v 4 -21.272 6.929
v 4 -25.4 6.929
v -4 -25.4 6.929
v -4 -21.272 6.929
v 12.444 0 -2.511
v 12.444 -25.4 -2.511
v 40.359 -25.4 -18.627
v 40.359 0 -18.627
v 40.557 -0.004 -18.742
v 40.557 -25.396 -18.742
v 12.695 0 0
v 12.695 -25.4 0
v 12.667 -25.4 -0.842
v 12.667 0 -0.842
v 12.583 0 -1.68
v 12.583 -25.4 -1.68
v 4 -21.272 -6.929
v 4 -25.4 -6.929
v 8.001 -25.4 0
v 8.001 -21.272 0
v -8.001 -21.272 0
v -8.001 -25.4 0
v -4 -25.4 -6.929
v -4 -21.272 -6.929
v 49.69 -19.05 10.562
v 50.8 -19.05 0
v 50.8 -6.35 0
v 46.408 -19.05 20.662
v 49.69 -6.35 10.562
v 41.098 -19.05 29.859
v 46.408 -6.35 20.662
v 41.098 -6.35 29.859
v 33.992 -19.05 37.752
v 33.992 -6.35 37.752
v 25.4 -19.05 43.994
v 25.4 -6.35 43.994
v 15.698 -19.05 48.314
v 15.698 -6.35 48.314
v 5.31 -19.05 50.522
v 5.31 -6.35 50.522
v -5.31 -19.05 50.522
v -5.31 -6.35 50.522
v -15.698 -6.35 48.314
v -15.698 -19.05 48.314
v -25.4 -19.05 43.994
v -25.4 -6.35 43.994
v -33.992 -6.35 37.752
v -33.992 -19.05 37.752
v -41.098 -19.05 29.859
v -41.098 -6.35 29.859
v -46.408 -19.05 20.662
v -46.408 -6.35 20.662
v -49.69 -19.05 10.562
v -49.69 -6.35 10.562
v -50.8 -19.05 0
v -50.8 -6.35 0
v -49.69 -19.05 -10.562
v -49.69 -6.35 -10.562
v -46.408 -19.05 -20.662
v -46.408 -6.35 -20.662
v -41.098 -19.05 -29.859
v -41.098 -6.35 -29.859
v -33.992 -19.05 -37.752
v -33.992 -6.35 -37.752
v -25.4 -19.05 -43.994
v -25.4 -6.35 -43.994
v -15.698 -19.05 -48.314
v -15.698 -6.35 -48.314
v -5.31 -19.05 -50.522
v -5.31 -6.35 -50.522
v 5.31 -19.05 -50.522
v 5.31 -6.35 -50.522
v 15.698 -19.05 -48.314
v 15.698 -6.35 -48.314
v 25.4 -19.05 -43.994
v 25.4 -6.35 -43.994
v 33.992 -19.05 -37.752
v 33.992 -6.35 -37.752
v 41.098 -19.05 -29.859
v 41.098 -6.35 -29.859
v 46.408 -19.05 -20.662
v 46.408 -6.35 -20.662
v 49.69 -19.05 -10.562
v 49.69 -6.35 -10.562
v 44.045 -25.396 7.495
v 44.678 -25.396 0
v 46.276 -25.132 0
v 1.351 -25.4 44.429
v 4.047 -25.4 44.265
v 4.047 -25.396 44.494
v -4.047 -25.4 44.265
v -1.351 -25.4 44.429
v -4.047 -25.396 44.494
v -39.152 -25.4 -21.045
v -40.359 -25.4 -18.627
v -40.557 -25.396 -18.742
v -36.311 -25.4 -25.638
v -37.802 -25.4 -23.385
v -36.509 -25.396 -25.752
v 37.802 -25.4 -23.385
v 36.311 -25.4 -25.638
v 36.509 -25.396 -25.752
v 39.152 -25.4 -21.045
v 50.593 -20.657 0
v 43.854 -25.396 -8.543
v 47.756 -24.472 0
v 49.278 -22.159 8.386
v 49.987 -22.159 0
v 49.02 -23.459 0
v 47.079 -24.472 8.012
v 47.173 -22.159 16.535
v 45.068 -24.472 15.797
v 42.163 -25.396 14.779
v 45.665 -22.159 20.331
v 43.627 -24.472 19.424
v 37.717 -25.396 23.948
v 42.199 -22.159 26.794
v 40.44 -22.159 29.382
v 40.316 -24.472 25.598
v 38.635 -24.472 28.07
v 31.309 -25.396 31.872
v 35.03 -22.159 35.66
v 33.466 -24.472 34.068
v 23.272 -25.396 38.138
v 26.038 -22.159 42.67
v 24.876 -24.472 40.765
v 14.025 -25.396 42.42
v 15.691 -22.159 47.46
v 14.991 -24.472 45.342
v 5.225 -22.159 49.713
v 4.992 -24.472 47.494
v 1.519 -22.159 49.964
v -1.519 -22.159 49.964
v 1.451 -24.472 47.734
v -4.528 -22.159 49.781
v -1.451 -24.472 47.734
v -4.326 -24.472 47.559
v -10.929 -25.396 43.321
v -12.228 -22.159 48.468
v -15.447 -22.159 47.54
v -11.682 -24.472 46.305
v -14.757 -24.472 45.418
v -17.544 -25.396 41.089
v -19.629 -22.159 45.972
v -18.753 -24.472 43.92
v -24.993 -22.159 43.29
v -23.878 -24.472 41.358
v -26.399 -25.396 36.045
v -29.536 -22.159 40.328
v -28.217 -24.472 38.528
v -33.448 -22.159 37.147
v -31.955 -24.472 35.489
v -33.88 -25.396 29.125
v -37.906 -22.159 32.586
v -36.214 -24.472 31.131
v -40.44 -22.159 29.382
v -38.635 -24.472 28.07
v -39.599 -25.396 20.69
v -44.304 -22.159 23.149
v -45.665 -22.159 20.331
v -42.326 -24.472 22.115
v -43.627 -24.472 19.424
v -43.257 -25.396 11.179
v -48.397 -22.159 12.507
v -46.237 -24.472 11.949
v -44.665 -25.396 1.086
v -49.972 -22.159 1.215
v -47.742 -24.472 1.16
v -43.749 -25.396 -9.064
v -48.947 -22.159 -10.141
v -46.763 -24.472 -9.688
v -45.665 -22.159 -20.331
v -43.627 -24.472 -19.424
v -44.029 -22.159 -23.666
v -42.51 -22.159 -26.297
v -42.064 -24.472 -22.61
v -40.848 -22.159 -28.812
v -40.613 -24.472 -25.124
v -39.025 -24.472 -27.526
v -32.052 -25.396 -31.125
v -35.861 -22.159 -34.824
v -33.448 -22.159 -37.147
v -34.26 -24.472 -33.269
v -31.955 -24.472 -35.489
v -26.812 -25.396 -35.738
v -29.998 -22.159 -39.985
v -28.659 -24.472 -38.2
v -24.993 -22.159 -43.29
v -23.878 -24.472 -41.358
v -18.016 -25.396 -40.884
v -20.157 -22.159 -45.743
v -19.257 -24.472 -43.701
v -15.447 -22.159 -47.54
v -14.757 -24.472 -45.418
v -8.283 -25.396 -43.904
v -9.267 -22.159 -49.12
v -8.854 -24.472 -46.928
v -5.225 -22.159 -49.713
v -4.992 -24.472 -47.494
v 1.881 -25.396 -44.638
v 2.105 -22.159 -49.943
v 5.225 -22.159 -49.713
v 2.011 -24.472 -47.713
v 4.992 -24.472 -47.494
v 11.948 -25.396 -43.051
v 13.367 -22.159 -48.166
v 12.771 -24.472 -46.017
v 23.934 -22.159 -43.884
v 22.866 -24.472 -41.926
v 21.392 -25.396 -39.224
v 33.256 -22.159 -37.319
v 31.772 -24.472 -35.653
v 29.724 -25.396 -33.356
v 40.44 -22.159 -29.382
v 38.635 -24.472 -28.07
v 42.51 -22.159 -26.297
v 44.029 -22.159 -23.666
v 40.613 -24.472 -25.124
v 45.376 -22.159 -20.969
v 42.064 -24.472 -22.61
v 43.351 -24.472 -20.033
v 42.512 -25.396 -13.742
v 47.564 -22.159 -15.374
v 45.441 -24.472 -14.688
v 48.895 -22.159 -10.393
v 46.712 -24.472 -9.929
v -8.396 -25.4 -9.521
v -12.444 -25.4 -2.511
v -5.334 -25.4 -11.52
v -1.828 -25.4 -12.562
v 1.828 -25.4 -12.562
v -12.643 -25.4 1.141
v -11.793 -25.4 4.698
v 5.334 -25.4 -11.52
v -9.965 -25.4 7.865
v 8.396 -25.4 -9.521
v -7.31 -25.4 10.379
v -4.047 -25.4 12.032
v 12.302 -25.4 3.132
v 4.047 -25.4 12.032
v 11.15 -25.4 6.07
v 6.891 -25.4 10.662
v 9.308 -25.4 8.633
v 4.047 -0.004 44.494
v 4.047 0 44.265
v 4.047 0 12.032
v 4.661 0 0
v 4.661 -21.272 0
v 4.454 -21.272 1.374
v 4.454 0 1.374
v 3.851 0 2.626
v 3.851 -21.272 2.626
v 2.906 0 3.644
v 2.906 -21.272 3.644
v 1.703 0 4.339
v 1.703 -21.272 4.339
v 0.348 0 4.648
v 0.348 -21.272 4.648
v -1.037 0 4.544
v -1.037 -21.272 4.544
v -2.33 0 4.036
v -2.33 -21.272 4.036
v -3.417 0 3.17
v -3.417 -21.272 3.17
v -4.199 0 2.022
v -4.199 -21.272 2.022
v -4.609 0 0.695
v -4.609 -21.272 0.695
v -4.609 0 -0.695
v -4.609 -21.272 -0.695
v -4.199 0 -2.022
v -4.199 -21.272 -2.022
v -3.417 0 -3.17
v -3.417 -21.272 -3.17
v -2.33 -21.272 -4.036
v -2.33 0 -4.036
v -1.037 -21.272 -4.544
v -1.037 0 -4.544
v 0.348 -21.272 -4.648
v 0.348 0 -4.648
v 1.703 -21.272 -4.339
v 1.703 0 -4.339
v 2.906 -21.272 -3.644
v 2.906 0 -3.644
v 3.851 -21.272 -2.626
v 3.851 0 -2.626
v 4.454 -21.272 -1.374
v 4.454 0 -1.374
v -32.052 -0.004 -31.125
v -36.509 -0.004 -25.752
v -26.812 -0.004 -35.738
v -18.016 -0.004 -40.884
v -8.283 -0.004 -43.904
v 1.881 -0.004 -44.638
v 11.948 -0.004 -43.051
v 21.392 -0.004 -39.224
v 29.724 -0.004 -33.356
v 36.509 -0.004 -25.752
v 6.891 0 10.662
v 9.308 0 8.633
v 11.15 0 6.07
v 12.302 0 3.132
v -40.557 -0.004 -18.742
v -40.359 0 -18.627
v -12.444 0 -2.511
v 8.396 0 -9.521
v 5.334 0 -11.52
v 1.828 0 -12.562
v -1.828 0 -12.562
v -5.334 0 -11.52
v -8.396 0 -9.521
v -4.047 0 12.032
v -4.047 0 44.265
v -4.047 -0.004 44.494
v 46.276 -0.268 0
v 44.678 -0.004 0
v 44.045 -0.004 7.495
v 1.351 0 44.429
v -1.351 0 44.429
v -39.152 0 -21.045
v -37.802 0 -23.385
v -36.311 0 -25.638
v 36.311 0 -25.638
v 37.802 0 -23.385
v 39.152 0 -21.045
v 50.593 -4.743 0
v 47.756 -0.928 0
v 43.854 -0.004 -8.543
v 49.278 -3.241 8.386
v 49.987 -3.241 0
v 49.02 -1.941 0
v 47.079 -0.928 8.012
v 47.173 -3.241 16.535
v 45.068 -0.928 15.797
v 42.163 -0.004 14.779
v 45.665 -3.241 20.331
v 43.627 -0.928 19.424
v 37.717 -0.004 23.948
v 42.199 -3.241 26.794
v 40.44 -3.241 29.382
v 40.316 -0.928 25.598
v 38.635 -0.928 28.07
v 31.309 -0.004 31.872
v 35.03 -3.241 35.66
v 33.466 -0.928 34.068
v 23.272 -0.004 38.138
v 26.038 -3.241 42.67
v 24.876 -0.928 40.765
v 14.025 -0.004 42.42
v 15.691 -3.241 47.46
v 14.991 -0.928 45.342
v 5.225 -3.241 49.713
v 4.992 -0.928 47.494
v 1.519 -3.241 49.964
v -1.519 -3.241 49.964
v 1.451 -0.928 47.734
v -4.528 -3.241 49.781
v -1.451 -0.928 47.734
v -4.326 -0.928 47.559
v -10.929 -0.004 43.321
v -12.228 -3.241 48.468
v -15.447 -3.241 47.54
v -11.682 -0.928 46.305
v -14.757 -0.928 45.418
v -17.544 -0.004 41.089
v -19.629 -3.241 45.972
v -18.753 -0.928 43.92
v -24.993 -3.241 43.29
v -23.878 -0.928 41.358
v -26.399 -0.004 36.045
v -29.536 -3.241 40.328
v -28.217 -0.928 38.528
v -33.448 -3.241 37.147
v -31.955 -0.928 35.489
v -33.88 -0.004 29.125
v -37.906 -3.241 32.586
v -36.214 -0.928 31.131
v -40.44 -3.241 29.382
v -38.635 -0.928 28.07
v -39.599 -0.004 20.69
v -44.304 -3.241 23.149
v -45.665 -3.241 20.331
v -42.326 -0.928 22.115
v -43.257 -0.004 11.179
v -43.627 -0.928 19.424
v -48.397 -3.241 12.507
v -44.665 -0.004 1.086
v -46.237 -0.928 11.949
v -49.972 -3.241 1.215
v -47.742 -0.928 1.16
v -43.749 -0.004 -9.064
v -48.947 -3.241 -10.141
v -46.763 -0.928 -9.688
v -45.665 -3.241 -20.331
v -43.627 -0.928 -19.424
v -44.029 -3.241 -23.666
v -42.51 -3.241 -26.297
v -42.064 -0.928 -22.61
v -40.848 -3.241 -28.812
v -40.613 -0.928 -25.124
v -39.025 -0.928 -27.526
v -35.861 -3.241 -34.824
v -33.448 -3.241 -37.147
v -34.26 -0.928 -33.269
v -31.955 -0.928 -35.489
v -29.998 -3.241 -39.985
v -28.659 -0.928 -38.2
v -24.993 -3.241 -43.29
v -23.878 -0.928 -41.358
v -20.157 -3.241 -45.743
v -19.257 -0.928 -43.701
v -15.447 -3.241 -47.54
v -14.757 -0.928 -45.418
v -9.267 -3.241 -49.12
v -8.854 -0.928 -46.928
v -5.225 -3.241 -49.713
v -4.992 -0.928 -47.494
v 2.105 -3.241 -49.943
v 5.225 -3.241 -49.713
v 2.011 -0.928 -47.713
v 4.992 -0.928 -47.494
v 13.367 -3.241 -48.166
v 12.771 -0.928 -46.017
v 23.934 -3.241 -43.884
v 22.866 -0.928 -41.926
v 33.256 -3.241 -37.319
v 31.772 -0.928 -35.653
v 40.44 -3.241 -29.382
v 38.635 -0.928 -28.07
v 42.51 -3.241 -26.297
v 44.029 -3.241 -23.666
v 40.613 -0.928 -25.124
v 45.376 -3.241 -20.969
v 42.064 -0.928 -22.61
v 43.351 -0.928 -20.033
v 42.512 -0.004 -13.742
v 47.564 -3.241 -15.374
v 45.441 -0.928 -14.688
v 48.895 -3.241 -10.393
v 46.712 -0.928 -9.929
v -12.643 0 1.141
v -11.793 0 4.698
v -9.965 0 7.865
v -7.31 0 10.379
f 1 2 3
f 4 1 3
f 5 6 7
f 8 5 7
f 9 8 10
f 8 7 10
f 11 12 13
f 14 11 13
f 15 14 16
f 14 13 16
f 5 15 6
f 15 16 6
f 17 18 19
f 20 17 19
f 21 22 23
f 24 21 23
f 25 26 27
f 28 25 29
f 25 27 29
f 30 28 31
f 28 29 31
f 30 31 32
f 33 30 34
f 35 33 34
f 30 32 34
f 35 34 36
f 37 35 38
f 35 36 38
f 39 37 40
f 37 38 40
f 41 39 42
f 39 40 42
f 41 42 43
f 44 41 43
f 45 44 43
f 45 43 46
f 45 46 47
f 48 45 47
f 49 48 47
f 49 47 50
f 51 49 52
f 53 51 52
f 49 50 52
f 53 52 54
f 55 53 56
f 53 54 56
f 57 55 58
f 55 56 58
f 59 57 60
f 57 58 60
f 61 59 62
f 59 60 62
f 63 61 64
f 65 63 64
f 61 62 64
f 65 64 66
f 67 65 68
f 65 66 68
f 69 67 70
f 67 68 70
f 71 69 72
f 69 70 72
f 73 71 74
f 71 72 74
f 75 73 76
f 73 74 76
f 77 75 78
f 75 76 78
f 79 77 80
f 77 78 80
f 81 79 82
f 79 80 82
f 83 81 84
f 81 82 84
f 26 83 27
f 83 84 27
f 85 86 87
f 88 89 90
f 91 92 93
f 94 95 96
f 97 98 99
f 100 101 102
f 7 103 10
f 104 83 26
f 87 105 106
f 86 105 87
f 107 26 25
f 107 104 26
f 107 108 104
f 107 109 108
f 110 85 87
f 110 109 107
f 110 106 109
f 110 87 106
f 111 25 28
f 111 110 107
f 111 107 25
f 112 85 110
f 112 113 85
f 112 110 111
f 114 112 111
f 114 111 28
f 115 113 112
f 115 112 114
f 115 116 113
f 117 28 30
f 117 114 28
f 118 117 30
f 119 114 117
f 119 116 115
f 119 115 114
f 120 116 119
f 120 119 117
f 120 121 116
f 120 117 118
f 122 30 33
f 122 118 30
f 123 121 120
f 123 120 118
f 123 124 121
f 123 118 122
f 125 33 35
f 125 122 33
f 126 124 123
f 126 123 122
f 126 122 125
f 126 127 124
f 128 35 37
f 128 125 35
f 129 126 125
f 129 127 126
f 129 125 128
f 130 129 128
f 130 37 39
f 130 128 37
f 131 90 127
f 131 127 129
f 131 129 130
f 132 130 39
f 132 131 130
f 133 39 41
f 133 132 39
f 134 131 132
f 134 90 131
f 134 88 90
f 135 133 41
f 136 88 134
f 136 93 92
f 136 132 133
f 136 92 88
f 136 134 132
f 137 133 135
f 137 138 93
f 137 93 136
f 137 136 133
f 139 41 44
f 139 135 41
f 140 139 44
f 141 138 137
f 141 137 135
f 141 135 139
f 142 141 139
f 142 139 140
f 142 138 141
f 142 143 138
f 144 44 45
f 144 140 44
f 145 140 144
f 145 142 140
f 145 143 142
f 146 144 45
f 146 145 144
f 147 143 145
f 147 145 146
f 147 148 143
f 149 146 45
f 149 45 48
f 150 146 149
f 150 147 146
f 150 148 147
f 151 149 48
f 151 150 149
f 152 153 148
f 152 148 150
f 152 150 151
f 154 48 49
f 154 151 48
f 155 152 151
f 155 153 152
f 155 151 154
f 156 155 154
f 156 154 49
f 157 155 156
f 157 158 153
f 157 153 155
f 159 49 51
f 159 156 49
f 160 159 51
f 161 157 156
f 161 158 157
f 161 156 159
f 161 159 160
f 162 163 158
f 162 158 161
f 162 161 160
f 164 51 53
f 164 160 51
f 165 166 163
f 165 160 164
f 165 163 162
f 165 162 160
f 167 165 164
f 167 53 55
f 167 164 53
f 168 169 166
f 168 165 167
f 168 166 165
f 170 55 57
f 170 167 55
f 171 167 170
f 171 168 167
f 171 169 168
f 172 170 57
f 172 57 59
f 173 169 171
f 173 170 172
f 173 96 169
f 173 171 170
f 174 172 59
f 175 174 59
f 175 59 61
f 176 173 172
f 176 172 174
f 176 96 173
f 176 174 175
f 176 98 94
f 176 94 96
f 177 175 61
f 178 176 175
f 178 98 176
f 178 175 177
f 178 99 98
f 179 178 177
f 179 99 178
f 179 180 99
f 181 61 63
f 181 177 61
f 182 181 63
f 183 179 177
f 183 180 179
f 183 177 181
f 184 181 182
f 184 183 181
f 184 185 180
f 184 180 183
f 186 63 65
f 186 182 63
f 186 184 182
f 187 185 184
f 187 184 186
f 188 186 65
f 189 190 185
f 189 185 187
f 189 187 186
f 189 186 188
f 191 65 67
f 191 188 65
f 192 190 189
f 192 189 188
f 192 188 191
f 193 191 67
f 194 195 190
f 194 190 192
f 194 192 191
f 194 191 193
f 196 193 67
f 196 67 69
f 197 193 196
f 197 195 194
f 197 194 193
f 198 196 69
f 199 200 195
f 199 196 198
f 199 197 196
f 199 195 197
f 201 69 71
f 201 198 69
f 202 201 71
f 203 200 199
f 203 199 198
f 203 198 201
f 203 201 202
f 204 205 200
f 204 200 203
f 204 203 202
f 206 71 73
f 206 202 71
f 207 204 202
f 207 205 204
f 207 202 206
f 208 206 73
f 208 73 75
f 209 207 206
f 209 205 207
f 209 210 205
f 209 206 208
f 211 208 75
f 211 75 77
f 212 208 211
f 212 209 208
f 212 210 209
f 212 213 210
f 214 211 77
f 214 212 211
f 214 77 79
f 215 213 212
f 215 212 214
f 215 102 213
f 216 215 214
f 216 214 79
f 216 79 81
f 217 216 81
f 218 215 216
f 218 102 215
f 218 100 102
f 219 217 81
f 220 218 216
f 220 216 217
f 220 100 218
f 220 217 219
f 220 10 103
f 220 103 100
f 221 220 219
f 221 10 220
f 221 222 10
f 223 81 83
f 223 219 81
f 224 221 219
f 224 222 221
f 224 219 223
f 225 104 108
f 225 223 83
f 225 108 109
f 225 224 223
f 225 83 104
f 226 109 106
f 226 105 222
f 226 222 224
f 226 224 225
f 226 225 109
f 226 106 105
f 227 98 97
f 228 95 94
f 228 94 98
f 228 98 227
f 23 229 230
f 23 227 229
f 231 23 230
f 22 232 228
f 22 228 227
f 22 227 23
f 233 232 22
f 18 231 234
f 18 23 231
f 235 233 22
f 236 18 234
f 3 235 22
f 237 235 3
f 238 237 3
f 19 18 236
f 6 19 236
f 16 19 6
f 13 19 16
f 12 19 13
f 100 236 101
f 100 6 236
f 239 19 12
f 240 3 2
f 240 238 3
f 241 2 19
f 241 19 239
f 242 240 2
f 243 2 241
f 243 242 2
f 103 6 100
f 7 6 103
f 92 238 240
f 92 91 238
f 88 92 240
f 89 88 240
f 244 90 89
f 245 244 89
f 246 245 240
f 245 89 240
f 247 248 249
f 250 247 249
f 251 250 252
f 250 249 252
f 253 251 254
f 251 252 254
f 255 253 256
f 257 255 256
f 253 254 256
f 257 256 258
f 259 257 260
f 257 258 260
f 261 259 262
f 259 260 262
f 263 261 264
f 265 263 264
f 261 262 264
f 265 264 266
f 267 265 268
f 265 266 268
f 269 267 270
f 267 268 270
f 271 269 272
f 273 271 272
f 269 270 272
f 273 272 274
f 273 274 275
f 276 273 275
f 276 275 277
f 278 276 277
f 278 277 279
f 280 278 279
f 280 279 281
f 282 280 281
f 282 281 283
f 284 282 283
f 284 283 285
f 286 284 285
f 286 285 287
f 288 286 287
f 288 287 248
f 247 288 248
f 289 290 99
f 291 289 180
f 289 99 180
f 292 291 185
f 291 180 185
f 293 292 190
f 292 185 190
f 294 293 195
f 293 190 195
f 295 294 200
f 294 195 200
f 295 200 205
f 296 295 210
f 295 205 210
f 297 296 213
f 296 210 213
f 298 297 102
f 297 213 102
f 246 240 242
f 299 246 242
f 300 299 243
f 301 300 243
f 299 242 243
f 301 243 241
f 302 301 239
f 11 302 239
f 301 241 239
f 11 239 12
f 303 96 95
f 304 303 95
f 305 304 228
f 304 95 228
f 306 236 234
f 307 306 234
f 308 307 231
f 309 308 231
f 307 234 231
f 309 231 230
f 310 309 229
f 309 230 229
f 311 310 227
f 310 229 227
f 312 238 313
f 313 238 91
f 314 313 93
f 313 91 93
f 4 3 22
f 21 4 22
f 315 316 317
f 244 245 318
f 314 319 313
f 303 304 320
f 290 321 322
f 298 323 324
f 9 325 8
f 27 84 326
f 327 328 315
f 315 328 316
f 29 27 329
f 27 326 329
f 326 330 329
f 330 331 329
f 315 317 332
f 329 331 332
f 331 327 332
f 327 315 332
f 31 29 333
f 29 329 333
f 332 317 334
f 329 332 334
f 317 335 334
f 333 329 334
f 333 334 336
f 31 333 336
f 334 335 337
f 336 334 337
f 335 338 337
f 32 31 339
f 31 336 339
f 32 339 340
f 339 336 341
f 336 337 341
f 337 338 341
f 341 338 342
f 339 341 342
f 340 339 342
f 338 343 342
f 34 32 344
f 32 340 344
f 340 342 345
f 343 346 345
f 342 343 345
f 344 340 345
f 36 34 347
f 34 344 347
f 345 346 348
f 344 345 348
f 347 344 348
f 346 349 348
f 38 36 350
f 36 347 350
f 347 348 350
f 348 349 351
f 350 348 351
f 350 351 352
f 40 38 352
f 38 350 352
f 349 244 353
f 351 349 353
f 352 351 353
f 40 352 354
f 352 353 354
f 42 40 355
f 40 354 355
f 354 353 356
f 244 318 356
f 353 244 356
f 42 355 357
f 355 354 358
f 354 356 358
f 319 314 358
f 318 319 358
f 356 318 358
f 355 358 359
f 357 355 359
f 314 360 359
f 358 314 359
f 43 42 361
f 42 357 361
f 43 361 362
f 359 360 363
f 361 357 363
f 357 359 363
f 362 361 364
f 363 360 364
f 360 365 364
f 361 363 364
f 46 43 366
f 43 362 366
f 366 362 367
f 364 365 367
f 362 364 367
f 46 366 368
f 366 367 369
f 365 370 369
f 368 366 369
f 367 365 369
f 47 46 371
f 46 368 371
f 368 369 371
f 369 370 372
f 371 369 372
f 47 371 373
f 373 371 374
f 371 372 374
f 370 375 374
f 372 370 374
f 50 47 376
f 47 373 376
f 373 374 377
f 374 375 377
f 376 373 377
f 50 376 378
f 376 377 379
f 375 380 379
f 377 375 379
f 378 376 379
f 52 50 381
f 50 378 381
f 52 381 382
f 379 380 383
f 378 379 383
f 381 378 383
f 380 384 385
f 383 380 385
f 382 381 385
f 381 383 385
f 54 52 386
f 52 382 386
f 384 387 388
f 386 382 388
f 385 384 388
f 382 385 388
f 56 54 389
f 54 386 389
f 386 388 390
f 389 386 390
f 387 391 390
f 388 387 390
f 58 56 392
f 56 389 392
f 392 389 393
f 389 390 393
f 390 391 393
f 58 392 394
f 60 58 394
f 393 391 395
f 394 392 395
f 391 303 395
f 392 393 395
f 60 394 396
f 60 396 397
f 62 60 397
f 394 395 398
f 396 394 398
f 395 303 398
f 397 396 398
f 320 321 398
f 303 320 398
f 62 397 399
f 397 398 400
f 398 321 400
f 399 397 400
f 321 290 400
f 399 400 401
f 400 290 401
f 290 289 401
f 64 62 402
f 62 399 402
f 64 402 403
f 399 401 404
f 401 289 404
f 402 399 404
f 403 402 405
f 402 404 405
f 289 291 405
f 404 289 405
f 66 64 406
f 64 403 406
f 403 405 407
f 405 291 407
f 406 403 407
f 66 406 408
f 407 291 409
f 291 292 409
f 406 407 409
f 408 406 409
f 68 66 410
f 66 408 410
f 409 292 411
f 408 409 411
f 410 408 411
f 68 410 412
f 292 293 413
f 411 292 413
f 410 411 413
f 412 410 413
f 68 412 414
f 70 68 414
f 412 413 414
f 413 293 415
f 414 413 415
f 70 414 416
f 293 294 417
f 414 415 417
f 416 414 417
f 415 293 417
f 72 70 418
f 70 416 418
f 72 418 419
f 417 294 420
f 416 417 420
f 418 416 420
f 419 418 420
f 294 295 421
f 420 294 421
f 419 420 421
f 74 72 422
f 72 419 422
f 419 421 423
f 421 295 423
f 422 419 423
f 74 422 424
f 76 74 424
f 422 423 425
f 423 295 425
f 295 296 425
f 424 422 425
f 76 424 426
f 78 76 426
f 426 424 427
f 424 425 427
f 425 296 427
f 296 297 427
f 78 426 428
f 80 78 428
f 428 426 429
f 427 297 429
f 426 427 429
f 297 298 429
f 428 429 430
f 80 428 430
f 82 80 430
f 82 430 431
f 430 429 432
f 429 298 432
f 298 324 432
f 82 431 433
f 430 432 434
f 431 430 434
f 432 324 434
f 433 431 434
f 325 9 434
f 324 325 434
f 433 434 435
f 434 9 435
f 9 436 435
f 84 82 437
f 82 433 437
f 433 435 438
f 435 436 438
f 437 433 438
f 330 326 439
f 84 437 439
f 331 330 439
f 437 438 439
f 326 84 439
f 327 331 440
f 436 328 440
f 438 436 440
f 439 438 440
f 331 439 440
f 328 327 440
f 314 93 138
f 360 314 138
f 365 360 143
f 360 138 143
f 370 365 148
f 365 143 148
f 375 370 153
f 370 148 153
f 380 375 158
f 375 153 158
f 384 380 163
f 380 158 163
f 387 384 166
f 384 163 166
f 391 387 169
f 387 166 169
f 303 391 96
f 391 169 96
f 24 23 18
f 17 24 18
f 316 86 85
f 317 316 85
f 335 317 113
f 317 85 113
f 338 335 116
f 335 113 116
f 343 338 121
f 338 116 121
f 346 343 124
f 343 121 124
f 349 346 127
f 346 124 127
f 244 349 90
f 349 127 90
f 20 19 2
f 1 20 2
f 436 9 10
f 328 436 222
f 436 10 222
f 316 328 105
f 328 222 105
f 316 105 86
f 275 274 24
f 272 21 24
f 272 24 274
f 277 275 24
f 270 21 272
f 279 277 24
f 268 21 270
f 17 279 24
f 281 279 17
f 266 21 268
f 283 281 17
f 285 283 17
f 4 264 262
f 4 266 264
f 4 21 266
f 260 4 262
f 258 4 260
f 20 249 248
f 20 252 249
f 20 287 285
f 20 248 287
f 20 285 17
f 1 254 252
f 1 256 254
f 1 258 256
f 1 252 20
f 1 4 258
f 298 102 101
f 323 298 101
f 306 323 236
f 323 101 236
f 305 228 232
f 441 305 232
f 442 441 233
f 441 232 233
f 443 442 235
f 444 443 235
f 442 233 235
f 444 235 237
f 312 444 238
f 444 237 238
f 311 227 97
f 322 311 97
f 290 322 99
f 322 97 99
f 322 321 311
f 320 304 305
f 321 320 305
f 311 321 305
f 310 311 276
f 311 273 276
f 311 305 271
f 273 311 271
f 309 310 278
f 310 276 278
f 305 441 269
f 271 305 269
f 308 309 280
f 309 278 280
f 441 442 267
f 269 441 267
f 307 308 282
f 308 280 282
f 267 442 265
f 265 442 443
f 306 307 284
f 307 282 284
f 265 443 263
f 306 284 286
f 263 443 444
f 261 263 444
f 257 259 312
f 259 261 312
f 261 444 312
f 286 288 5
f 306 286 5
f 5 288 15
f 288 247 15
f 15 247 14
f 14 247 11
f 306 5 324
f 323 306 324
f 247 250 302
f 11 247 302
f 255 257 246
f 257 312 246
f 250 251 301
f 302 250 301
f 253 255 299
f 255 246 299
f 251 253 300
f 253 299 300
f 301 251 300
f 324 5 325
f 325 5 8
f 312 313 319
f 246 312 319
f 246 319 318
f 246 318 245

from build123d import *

# Parameters (mm, degrees)
F0_R     = 50.8
F1_DEPTH = 25.4
F4_DEPTH = 4.1275
F5_R     = 4.6609
F6_DEPTH = 25.401
F7_R     = 6.35
F9_DEPTH = 25.4


with BuildPart() as f1:
    # F0 (on Front) → F1 (new body)
    with BuildSketch(Plane.XZ):
        Circle(F0_R)
    extrude(amount=F1_DEPTH)

    # F3 (on face) → F4 (cut, symmetric)
    with BuildSketch(Plane.XZ.offset(25.4)):
        Polygon((4.0005, 6.9290692557), (-4.0005, 6.9290692557), (-8.001, 0), (-4.0005, -6.9290692557), (4.0005, -6.9290692557), (8.001, 0), align=None)
    extrude(amount=F4_DEPTH, both=True, mode=Mode.SUBTRACT)

    # F5 (on face) → F6 (cut, through all)
    with BuildSketch(Plane.XZ.offset(25.4)):
        Circle(F5_R)
    extrude(amount=-F6_DEPTH, mode=Mode.SUBTRACT)

    # F7
    f7_edges = [f1.edges().sort_by_distance(p)[0] for p in [
        (-50.8, -25.4, 0),
        (-50.8, 0, 0),
    ]]
    fillet(f7_edges, radius=F7_R)

    # F8 (on face) → F9 (cut, through all)
    with BuildSketch(Plane.XZ.offset(25.4)):
        with BuildLine():
            Line((4.0474563271, 44.494312185), (4.0474563271, 12.0321052626))
            ThreePointArc((4.0474563271, 12.0321052626), (10.3085981834, 7.4085263895), (12.6946232622, 0))
            ThreePointArc((12.6946232622, 0), (12.6317710989, -1.2616729662), (12.443836982, -2.5108526313))
            Line((12.443836982, -2.5108526313), (40.5569328397, -18.7419560925))
            ThreePointArc((40.5569328397, -18.7419560925), (43.6355891953, -9.594846279), (44.6780227801, 0))
            ThreePointArc((44.6780227801, 0), (32.9921056127, 30.1271752206), (4.0474563271, 44.494312185))
        make_face()
        with BuildLine():
            ThreePointArc((-12.443836982, -2.5108526313), (-10.9938662366, 6.3473116311), (-4.0474563271, 12.0321052626))
            Line((-4.0474563271, 12.0321052626), (-4.0474563271, 44.494312185))
            ThreePointArc((-4.0474563271, 44.494312185), (-38.6923027184, 22.33901139), (-40.5569328397, -18.7419560925))
            Line((-40.5569328397, -18.7419560925), (-12.443836982, -2.5108526313))
        make_face()
        with BuildLine():
            Line((36.5094765126, -25.7523560925), (8.3963806548, -9.5212526313))
            ThreePointArc((8.3963806548, -9.5212526313), (0, -12.6946232622), (-8.3963806548, -9.5212526313))
            Line((-8.3963806548, -9.5212526313), (-36.5094765126, -25.7523560925))
            ThreePointArc((-36.5094765126, -25.7523560925), (0, -44.6780227801), (36.5094765126, -25.7523560925))
        make_face()
    extrude(amount=-F9_DEPTH, mode=Mode.SUBTRACT)


solid = f1.part
